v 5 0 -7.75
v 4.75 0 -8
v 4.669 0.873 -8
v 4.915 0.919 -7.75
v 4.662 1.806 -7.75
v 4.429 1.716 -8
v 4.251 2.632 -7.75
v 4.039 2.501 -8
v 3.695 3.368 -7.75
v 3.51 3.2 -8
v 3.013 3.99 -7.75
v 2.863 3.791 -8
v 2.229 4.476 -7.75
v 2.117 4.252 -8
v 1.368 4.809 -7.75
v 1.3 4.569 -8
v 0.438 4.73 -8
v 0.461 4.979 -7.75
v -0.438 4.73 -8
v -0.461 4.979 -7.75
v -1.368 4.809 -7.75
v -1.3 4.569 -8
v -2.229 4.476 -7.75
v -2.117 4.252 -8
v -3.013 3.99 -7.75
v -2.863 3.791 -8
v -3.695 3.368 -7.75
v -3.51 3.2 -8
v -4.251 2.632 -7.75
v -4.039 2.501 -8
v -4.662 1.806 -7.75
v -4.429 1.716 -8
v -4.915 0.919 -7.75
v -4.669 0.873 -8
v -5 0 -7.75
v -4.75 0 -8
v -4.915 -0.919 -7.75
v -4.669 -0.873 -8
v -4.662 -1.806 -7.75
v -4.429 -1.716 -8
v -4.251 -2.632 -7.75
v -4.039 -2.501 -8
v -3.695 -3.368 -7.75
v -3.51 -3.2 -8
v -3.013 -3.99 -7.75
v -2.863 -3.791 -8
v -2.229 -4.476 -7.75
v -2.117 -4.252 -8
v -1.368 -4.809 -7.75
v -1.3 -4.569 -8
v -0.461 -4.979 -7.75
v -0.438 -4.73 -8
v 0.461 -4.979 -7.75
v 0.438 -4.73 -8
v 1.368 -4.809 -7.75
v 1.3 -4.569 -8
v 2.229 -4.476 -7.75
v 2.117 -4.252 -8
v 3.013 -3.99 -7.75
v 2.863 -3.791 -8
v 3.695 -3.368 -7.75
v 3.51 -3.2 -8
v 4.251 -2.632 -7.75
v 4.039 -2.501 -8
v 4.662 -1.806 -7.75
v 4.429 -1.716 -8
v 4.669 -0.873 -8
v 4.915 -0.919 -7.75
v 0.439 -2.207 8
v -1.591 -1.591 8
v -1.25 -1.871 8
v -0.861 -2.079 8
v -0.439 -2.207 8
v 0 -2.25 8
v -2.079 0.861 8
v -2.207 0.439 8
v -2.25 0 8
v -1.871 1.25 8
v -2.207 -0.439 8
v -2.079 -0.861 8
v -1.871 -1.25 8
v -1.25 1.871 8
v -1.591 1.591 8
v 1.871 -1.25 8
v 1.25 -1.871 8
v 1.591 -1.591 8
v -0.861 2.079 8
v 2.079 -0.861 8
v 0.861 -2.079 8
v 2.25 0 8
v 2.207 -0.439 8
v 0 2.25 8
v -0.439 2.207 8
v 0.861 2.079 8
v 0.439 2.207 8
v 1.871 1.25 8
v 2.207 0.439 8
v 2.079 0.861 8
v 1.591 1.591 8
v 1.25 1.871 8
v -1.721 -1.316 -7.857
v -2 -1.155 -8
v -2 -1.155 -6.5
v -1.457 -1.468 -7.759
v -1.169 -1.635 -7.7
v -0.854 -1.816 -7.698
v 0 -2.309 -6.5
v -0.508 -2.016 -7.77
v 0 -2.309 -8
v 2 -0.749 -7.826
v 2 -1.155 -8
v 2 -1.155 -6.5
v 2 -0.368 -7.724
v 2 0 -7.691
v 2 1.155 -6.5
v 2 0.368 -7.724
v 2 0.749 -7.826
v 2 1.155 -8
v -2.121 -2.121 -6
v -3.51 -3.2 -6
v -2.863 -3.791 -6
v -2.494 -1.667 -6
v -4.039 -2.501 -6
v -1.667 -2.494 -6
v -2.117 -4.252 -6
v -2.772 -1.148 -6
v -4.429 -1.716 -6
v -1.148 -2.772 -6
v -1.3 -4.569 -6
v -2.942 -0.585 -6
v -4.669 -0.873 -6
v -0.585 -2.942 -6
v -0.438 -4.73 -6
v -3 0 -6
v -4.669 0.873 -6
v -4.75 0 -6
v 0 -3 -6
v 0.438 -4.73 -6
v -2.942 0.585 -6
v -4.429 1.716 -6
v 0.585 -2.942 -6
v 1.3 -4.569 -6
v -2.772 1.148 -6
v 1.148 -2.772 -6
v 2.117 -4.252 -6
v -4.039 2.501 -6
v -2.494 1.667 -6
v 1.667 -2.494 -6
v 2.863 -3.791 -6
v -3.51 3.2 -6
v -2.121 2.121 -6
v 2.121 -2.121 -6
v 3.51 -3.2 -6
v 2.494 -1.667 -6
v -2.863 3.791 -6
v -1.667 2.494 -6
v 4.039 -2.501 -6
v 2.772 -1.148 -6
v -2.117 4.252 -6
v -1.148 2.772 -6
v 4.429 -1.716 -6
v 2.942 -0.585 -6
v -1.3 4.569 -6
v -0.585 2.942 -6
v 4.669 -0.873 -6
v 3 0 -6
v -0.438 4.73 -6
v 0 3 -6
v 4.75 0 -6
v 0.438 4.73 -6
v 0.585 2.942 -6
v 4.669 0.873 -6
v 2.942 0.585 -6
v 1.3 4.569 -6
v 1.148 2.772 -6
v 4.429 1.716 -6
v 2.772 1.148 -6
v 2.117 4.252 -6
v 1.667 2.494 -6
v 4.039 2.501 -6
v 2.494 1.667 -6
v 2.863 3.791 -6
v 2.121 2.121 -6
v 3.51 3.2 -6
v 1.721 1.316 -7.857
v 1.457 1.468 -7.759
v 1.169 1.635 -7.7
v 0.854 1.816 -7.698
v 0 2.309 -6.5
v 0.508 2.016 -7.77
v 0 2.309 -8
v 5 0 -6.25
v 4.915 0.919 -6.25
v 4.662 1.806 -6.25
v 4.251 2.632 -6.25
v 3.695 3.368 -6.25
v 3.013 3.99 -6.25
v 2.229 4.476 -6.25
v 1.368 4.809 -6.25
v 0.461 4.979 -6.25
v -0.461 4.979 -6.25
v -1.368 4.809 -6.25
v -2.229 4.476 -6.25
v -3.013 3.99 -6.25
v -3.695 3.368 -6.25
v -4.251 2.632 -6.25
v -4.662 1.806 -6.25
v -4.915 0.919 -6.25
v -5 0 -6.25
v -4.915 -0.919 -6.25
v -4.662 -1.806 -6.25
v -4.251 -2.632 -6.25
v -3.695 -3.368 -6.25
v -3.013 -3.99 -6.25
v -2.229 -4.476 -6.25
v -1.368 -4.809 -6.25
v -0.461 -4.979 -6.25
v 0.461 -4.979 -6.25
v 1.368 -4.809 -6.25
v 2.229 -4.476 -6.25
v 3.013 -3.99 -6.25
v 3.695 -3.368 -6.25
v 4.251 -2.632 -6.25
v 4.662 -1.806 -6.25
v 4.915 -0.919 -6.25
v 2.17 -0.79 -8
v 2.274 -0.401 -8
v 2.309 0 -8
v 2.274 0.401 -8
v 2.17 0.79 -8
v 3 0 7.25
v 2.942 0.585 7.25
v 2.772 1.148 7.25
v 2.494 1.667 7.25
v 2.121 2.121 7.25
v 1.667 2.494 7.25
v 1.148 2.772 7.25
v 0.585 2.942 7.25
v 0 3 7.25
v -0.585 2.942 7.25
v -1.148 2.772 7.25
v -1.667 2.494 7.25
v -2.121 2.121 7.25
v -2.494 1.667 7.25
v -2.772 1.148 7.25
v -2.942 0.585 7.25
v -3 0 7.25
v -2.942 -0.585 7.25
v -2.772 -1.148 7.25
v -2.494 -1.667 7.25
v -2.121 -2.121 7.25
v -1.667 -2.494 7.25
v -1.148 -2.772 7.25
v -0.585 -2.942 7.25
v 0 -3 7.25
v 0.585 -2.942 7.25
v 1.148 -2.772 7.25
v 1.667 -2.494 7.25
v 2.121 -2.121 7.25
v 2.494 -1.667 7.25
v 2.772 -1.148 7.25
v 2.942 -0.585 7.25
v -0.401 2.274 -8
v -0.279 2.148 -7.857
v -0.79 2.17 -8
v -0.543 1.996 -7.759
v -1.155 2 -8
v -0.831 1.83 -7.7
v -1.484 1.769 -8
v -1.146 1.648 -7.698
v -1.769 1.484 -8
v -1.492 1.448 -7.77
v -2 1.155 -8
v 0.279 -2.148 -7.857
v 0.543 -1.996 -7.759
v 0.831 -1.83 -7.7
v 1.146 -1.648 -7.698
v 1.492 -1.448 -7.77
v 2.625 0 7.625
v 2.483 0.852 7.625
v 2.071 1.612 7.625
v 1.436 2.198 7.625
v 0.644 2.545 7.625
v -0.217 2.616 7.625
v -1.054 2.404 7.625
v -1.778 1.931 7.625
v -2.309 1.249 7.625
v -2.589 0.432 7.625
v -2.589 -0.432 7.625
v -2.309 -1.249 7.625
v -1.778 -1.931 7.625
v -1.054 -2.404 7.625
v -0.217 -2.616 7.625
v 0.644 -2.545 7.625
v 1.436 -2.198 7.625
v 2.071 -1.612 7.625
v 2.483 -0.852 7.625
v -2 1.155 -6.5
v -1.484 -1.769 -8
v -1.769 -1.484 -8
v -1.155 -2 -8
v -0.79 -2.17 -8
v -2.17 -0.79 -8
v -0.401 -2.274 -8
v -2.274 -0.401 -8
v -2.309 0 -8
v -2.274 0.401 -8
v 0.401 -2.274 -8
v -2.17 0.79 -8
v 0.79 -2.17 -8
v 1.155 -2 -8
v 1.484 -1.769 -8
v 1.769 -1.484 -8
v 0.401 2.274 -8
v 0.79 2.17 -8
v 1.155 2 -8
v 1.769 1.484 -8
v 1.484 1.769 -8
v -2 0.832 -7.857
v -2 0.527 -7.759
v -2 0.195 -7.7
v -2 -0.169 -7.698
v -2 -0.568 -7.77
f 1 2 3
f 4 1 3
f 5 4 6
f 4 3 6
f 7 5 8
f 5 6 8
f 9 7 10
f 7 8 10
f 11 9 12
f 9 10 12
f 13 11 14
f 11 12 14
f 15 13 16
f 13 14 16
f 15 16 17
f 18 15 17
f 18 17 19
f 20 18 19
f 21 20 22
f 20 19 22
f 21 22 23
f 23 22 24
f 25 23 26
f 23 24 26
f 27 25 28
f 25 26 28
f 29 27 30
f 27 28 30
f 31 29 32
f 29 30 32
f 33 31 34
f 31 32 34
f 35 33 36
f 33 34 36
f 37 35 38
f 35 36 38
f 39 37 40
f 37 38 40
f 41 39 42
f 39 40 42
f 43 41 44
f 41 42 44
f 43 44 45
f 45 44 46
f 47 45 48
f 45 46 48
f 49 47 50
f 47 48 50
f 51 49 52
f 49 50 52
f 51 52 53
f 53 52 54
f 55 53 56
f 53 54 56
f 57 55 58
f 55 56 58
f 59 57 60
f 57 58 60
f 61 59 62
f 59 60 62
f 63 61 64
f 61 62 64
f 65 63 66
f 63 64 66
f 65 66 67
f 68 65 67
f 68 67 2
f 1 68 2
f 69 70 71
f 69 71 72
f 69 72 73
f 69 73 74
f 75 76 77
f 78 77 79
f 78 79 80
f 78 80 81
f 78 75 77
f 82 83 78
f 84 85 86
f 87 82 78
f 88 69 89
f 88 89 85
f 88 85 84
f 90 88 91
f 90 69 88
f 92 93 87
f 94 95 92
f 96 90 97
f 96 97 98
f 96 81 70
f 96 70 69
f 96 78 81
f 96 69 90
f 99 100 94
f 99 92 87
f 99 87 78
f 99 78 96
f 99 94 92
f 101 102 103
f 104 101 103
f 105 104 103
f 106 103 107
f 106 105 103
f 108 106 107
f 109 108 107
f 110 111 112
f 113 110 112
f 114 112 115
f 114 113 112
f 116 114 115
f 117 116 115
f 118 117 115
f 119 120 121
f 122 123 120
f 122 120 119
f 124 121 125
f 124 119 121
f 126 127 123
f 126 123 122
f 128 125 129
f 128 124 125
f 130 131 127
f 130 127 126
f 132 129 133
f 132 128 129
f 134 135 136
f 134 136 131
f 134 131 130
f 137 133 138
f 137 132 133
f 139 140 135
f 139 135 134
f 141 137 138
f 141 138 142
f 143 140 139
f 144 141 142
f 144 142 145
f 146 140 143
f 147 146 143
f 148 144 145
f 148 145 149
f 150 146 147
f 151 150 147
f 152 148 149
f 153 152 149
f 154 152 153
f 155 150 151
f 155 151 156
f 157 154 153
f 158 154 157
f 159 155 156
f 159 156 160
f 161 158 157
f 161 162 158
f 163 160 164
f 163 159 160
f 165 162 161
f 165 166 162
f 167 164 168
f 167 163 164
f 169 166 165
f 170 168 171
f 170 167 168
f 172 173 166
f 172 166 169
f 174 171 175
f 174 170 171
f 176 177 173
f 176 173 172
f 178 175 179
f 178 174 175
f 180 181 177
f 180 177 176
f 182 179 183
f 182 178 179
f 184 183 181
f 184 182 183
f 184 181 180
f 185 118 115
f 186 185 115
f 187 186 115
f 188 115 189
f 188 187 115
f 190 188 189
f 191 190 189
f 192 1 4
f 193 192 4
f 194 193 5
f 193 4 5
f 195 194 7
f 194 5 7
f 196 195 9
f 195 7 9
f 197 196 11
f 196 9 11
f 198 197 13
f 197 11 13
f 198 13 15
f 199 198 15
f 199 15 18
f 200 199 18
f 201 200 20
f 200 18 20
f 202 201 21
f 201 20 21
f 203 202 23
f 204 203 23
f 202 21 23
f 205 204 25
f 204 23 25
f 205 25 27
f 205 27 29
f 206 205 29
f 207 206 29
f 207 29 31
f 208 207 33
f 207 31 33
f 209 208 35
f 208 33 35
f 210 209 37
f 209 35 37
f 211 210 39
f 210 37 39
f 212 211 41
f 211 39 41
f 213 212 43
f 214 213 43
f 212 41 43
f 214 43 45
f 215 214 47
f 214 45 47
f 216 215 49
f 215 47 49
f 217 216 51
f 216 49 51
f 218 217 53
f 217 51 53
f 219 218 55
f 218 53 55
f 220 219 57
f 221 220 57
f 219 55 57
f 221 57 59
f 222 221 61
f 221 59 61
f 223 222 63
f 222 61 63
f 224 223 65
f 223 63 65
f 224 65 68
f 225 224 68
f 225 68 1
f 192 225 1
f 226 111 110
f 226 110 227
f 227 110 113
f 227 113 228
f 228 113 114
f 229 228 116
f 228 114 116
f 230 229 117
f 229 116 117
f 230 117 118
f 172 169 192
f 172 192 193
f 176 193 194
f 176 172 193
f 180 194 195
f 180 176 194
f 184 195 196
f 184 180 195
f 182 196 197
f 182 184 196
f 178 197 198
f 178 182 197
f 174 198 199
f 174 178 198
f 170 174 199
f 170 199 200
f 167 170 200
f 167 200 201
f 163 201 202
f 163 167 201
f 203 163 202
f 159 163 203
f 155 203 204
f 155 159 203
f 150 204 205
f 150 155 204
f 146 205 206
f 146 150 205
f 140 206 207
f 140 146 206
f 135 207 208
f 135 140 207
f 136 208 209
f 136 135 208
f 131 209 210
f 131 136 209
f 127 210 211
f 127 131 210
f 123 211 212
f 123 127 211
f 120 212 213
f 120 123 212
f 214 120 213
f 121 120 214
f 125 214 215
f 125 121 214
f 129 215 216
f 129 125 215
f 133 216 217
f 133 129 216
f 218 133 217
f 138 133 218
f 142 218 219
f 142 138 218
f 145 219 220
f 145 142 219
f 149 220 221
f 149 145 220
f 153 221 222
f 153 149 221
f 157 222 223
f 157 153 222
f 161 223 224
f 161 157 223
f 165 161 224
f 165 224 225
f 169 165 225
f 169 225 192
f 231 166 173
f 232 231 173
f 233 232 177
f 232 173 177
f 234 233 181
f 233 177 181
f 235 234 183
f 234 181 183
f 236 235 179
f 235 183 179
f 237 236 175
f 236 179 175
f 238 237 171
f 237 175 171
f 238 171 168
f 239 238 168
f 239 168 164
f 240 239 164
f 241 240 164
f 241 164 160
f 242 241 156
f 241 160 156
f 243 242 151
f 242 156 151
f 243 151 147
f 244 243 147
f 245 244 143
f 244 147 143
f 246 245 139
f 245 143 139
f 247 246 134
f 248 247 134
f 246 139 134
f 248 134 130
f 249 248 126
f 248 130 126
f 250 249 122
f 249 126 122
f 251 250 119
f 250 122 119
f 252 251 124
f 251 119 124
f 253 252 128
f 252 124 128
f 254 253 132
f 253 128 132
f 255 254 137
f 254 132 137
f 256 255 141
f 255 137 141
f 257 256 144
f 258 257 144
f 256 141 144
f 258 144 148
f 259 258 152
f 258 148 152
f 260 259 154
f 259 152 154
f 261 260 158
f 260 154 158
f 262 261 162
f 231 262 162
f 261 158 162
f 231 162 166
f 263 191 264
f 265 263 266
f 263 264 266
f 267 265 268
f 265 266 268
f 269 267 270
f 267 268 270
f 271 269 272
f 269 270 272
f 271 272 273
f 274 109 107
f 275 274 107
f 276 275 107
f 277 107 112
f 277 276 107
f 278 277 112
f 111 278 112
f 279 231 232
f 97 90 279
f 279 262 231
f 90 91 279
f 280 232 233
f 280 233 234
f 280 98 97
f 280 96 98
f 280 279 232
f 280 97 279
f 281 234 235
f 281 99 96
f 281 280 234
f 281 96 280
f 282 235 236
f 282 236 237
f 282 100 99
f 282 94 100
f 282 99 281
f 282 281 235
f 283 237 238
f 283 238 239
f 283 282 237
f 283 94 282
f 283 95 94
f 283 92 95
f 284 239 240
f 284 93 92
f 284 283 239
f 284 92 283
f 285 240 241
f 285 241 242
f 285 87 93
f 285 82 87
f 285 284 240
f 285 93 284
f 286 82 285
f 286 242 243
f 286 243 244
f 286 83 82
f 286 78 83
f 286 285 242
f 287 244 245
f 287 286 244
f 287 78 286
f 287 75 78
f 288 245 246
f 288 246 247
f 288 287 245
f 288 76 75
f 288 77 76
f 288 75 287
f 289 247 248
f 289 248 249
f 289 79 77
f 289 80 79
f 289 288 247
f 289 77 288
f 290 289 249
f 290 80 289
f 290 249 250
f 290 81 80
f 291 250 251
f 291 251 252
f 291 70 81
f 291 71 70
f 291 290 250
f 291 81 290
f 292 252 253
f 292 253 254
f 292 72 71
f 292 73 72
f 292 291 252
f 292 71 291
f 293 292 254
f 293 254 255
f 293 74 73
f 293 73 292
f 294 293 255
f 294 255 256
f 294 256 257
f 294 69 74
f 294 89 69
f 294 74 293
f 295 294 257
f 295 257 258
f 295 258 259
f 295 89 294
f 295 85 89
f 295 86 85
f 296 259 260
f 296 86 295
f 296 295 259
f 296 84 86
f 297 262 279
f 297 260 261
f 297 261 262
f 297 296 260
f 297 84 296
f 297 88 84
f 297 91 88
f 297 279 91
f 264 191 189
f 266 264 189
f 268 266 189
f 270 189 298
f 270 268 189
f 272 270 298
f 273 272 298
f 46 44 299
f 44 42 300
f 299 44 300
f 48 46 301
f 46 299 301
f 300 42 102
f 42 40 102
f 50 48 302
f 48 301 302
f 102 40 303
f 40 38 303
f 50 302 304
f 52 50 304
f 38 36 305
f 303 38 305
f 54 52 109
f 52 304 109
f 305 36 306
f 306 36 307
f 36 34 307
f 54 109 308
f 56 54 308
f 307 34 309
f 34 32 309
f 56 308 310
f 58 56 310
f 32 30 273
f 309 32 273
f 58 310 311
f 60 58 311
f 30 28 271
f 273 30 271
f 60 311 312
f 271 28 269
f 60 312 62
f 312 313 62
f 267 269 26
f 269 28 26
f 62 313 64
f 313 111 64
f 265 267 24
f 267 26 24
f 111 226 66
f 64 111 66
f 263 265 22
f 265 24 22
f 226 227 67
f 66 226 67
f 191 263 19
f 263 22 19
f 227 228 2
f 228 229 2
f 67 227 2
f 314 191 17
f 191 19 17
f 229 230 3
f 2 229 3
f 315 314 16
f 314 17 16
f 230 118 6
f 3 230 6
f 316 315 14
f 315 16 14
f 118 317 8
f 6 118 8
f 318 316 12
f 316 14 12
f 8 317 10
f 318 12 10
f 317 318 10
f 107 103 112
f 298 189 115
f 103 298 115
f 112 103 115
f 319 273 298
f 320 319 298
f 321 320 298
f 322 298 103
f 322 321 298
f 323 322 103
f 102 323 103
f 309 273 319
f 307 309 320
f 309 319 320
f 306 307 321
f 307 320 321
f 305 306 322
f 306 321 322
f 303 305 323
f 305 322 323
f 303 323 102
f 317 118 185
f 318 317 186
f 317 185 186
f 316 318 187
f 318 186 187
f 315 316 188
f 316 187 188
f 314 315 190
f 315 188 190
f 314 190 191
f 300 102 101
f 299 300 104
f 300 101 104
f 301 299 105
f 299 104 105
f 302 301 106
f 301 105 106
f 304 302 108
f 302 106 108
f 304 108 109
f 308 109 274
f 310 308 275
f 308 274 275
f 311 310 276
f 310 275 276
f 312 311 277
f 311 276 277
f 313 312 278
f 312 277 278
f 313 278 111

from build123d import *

# Parameters (mm, degrees)
EXTRUDE1_START     = -6
SKETCH1_R          = 3
EXTRUDE1_DEPTH     = 14
EXTRUDE2_START     = -8
SKETCH6_R          = 5
EXTRUDE2_DEPTH     = 2
CUT_EXTRUDE1_DEPTH = 1.5
SKETCH8_R          = 2.309401077
CUT_EXTRUDE2_DEPTH = 1.5
CUT_EXTRUDE2_TAPER = 45
CHAMFER1_SIZE      = 0.25
CHAMFER2_SIZE      = 0.75


with BuildPart() as part:
    # Sketch1 → Extrude1 (new body)
    with BuildSketch(Plane.XY.offset(EXTRUDE1_START)):
        Circle(SKETCH1_R)
    extrude(amount=EXTRUDE1_DEPTH)

    # Sketch6 → Extrude2 (add)
    with BuildSketch(Plane.XY.offset(EXTRUDE2_START)):
        Circle(SKETCH6_R)
    extrude(amount=EXTRUDE2_DEPTH)

    # Sketch7 → Cut-Extrude1 (cut)
    with BuildSketch(Plane.XY.offset(-8)):
        Polygon((0, 2.309401077), (-2, 1.154700538), (-2, -1.154700538), (0, -2.309401077), (2, -1.154700538), (2, 1.154700538), align=None)
    extrude(amount=CUT_EXTRUDE1_DEPTH, mode=Mode.SUBTRACT)

    # Sketch8 → Cut-Extrude2 (cut)
    with BuildSketch(Plane.XY.offset(-8)):
        Circle(SKETCH8_R)
    extrude(amount=CUT_EXTRUDE2_DEPTH, taper=CUT_EXTRUDE2_TAPER, mode=Mode.SUBTRACT)

    # Chamfer1
    chamfer1_edges = [part.edges().sort_by_distance(p)[0] for p in [
        (-5, 0, -6),
        (-5, 0, -8),
    ]]
    chamfer(chamfer1_edges, length=CHAMFER1_SIZE)

    # Chamfer2
    chamfer2_edges = [part.edges().sort_by_distance(p)[0] for p in [
        (-3, 0, 8),
    ]]
    chamfer(chamfer2_edges, length=CHAMFER2_SIZE)


solid = part.part
